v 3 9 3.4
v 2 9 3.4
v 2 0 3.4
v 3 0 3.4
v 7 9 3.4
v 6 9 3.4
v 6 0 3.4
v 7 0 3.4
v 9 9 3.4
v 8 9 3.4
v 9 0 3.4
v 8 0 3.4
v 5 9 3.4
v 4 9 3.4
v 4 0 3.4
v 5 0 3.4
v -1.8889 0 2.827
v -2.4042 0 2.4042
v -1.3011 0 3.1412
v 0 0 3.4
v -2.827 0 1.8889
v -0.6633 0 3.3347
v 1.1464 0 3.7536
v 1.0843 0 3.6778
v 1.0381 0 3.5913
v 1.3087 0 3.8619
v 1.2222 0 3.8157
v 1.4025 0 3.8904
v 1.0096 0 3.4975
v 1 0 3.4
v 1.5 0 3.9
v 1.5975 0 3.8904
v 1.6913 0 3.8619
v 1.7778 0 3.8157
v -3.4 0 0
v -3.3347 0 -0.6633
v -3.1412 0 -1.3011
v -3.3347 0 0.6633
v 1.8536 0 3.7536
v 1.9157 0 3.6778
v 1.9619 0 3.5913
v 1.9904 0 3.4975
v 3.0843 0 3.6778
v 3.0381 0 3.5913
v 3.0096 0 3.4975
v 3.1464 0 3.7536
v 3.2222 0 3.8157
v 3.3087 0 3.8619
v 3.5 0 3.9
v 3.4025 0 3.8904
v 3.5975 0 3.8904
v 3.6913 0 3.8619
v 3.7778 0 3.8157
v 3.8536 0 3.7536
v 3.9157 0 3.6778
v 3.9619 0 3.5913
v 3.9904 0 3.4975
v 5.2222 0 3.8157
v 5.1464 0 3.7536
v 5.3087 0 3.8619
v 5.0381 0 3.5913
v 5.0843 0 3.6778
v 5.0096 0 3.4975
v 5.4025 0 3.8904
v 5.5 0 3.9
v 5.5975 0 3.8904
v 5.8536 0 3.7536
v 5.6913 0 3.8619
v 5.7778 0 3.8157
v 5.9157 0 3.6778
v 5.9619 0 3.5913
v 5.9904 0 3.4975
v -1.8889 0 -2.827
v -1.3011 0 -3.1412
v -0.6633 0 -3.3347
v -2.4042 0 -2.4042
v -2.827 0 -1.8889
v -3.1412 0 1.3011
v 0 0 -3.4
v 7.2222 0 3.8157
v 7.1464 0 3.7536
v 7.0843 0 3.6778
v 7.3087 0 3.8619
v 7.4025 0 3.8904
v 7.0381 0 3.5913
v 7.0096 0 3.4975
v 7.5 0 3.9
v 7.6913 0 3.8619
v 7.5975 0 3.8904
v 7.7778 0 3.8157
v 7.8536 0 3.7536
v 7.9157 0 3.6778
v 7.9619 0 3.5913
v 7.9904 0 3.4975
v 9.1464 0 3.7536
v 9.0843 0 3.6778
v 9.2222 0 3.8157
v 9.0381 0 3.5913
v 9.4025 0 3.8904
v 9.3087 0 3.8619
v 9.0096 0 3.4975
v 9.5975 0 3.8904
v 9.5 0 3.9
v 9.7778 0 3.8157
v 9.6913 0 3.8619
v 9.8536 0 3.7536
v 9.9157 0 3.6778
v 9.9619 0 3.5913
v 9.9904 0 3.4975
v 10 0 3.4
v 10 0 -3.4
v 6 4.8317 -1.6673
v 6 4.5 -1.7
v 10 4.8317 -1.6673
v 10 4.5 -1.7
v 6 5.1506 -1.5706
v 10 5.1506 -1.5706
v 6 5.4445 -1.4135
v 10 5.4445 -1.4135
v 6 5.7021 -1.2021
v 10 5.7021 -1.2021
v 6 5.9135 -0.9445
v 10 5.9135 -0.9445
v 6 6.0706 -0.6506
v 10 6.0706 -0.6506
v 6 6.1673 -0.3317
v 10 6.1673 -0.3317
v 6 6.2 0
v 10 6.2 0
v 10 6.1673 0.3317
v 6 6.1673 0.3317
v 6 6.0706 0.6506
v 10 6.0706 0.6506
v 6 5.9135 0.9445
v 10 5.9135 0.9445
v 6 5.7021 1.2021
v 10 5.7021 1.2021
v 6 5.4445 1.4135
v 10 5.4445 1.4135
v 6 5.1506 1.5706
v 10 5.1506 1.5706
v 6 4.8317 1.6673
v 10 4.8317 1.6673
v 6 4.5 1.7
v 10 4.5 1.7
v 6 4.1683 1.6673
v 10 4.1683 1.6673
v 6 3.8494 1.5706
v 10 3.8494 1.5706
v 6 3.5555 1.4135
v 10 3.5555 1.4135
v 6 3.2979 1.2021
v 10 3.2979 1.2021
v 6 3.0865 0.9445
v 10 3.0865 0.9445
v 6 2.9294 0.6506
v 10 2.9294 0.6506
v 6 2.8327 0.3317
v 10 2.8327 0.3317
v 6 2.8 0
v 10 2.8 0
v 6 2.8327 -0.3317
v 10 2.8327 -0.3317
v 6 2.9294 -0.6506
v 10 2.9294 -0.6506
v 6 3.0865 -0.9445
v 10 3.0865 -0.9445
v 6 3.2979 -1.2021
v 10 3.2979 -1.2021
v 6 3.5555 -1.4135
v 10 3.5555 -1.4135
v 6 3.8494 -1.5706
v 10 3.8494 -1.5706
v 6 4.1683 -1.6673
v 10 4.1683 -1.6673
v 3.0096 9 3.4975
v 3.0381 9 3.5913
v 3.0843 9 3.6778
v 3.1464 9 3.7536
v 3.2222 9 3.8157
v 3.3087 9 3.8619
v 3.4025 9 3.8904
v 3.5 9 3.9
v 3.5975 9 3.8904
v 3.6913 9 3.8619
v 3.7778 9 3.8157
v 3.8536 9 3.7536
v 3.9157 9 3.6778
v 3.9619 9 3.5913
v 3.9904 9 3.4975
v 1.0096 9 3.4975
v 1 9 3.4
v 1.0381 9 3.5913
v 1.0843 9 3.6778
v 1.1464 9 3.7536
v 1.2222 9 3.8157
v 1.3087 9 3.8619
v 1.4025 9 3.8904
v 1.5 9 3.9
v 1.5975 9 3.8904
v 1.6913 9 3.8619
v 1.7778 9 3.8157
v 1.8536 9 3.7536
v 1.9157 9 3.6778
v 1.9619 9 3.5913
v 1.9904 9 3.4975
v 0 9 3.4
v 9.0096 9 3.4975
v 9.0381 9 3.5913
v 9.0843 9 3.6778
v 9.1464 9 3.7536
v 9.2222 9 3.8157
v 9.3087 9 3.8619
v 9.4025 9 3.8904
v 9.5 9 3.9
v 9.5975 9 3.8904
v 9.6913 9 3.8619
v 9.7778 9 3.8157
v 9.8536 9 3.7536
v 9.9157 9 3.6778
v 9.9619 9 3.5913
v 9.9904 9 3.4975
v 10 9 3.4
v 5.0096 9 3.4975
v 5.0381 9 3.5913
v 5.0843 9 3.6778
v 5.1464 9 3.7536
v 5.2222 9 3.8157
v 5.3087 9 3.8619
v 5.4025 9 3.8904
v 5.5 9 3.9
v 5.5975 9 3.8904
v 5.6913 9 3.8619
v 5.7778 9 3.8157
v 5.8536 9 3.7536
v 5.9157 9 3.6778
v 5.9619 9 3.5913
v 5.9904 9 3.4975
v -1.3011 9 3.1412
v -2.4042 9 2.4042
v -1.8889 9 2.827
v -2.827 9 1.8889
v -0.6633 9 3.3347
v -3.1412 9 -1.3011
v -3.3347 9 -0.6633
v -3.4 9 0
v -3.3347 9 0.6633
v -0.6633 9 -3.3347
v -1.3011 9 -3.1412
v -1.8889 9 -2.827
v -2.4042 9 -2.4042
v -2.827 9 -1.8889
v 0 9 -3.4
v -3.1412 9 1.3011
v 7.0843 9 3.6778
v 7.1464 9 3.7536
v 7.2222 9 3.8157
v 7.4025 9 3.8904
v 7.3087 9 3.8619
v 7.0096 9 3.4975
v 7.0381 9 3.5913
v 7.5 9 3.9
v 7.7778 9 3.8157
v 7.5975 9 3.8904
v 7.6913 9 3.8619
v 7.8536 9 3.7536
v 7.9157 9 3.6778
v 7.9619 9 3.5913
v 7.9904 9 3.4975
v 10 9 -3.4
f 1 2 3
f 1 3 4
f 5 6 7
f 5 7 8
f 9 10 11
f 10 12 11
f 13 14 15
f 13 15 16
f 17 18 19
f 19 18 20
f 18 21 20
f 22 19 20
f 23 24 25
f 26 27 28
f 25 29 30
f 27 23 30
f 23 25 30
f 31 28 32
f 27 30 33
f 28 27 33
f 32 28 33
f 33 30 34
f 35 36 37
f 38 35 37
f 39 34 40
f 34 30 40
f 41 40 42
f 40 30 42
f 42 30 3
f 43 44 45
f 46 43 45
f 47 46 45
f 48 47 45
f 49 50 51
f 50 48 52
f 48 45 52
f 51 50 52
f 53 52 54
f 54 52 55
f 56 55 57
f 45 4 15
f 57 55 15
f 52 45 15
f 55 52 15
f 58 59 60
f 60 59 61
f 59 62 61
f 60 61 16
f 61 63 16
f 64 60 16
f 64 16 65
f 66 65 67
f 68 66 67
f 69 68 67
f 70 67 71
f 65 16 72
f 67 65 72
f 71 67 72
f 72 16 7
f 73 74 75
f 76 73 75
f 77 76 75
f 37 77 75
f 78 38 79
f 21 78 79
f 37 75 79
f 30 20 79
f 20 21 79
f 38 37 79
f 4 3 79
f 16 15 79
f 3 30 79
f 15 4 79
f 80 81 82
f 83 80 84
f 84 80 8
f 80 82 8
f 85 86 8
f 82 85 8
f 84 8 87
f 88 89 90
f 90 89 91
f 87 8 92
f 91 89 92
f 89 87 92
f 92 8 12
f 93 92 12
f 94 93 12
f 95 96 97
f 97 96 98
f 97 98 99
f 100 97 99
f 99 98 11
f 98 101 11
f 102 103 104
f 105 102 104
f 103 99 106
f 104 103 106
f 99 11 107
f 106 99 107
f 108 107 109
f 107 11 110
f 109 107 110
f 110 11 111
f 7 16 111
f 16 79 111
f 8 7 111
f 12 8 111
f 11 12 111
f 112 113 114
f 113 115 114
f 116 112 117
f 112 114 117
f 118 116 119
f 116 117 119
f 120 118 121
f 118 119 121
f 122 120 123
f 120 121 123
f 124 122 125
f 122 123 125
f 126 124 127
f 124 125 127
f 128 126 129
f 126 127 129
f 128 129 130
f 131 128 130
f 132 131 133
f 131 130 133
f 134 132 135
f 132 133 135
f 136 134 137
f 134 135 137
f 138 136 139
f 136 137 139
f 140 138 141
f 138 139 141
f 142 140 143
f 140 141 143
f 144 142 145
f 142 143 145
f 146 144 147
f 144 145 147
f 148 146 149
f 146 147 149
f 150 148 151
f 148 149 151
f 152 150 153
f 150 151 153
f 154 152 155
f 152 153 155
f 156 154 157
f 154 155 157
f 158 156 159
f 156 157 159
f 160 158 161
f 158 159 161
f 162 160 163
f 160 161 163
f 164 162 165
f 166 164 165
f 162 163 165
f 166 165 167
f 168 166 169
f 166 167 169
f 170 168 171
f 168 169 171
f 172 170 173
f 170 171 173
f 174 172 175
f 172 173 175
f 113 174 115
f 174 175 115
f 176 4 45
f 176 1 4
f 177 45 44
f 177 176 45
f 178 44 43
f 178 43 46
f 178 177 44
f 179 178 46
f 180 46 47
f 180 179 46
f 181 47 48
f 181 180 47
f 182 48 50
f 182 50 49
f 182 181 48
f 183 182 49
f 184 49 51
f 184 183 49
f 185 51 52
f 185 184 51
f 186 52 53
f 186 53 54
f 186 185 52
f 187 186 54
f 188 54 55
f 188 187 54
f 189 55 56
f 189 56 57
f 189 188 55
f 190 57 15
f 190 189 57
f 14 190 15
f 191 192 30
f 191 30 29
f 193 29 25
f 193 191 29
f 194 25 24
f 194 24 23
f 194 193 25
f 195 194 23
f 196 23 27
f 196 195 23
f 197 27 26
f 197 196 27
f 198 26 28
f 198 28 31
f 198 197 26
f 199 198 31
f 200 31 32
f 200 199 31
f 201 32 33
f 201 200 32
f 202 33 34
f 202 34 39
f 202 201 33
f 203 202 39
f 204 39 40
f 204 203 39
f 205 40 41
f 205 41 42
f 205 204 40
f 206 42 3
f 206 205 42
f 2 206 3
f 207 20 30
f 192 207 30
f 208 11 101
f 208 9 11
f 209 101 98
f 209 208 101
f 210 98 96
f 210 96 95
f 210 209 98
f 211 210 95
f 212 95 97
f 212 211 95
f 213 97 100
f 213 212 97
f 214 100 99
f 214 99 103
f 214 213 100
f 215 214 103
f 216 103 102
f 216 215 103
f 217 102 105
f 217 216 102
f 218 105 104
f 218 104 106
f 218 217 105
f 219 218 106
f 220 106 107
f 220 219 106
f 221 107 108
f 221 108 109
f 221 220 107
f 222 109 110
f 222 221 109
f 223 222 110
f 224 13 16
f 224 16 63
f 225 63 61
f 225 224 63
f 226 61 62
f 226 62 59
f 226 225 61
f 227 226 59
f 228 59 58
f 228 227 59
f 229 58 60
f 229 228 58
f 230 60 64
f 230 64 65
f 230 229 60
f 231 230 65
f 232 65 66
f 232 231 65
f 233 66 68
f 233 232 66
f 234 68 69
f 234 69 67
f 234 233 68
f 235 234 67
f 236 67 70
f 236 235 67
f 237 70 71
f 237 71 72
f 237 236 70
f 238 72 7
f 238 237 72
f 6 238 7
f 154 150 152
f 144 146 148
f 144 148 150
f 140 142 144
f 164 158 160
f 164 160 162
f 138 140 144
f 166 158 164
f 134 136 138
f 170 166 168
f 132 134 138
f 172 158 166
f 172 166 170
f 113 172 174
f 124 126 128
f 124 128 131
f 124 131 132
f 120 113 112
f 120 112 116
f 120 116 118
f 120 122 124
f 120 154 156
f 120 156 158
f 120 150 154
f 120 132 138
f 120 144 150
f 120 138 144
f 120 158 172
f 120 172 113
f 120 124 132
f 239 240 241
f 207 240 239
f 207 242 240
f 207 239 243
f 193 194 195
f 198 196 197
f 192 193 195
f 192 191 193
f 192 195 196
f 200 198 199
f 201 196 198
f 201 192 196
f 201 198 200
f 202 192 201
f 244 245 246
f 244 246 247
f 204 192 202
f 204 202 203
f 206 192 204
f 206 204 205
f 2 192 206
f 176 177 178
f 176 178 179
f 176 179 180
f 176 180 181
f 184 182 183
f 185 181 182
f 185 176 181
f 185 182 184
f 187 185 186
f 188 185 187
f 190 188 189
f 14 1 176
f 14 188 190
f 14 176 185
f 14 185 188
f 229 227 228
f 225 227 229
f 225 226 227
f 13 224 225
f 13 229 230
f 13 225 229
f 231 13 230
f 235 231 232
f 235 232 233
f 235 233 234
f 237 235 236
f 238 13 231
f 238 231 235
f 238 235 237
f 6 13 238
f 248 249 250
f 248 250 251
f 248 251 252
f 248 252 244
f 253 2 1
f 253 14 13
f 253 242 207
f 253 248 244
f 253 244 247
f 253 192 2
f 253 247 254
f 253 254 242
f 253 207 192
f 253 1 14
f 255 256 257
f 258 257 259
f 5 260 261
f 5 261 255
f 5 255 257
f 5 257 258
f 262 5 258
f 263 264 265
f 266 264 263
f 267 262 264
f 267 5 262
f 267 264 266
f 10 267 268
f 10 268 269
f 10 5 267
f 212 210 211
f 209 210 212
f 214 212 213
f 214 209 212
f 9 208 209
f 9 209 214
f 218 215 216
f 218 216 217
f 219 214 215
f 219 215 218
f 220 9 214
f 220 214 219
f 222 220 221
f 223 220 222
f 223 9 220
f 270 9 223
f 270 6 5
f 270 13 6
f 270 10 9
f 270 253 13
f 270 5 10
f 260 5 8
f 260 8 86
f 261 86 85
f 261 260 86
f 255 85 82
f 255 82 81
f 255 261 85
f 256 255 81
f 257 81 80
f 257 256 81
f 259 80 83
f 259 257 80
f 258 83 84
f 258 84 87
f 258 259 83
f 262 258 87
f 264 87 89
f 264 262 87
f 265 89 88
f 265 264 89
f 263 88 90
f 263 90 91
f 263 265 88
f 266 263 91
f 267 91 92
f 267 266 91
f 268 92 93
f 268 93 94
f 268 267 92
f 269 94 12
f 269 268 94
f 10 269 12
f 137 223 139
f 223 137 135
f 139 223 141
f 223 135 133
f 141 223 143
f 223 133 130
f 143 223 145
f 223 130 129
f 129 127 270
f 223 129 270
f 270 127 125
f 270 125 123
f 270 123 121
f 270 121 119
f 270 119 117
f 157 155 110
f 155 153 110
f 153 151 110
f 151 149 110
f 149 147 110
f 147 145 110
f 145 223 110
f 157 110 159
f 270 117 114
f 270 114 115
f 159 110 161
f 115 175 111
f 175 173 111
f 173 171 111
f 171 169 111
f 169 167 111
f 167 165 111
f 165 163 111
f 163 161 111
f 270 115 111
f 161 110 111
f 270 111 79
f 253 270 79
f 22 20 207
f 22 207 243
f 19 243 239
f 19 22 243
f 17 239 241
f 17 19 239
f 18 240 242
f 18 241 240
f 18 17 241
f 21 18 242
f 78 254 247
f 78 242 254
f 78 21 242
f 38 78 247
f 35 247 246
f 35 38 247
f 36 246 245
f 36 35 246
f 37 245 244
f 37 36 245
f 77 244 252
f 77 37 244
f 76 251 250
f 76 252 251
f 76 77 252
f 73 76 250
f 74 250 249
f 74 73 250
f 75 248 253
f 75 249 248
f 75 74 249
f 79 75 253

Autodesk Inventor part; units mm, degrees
ref_plane "YZ Plane" through (0, 0, 0) normal (1, 0, 0) x (0, 1, 0)
ref_plane "XZ Plane" through (0, 0, 0) normal (0, 1, 0) x (-1, 0, 0)
ref_plane "XY Plane" through (0, 0, 0) normal (0, 0, 1) x (1, 0, 0)
sketch "Sketch1" plane through (0, 0, 0) normal (0, 1, 0) x (-1, 0, 0)
  arc A0 (0, -3.4) -> (0, 3.4) centre (0, 0) ccw
  line L0 (0, 3.4) -> (-10, 3.4)
  line L1 (-10, 3.4) -> (-10, -3.4)
  line L2 (-10, -3.4) -> (0, -3.4)
  line L3 (0, 3.4) -> (0, -3.4)
  dimension "d0" = 10
  dimension "d1" = 6.8
extrude "Extrusion1" add sketch "Sketch1" along normal blind 9
sketch "Sketch2" plane through (0, 9, 0) normal (0, 1, 0) x (1, 0, 0)
  line L0 (9, -3.4) -> (10, -3.4)
  arc A0 (9, -3.4) -> (10, -3.4) centre (9.5, -3.4) ccw
  point P0 (0, 0)
  dimension "d4" = 1
extrude "Extrusion2" add sketch "Sketch2" against normal blind 9
pattern_linear "Rectangular Pattern1" count 5 spacing 2 along (-1, 0, 0) of "Extrusion2"
sketch "Sketch3" plane through (10, 0, -3.4) normal (1, 0, 0) x (0, 0, -1)
  line L0 (-3.4, 0) -> (-3.4, 9)
  line L1 (0, 9) -> (-6.8, 9) projected
  circle A0 centre (-3.4, 4.5) radius 1.7
  dimension "d10" = 3.4
extrude "Extrusion3" cut sketch "Sketch3" against normal blind 4
properties part number "XY_Tensioner" material "ABS Plastic"
